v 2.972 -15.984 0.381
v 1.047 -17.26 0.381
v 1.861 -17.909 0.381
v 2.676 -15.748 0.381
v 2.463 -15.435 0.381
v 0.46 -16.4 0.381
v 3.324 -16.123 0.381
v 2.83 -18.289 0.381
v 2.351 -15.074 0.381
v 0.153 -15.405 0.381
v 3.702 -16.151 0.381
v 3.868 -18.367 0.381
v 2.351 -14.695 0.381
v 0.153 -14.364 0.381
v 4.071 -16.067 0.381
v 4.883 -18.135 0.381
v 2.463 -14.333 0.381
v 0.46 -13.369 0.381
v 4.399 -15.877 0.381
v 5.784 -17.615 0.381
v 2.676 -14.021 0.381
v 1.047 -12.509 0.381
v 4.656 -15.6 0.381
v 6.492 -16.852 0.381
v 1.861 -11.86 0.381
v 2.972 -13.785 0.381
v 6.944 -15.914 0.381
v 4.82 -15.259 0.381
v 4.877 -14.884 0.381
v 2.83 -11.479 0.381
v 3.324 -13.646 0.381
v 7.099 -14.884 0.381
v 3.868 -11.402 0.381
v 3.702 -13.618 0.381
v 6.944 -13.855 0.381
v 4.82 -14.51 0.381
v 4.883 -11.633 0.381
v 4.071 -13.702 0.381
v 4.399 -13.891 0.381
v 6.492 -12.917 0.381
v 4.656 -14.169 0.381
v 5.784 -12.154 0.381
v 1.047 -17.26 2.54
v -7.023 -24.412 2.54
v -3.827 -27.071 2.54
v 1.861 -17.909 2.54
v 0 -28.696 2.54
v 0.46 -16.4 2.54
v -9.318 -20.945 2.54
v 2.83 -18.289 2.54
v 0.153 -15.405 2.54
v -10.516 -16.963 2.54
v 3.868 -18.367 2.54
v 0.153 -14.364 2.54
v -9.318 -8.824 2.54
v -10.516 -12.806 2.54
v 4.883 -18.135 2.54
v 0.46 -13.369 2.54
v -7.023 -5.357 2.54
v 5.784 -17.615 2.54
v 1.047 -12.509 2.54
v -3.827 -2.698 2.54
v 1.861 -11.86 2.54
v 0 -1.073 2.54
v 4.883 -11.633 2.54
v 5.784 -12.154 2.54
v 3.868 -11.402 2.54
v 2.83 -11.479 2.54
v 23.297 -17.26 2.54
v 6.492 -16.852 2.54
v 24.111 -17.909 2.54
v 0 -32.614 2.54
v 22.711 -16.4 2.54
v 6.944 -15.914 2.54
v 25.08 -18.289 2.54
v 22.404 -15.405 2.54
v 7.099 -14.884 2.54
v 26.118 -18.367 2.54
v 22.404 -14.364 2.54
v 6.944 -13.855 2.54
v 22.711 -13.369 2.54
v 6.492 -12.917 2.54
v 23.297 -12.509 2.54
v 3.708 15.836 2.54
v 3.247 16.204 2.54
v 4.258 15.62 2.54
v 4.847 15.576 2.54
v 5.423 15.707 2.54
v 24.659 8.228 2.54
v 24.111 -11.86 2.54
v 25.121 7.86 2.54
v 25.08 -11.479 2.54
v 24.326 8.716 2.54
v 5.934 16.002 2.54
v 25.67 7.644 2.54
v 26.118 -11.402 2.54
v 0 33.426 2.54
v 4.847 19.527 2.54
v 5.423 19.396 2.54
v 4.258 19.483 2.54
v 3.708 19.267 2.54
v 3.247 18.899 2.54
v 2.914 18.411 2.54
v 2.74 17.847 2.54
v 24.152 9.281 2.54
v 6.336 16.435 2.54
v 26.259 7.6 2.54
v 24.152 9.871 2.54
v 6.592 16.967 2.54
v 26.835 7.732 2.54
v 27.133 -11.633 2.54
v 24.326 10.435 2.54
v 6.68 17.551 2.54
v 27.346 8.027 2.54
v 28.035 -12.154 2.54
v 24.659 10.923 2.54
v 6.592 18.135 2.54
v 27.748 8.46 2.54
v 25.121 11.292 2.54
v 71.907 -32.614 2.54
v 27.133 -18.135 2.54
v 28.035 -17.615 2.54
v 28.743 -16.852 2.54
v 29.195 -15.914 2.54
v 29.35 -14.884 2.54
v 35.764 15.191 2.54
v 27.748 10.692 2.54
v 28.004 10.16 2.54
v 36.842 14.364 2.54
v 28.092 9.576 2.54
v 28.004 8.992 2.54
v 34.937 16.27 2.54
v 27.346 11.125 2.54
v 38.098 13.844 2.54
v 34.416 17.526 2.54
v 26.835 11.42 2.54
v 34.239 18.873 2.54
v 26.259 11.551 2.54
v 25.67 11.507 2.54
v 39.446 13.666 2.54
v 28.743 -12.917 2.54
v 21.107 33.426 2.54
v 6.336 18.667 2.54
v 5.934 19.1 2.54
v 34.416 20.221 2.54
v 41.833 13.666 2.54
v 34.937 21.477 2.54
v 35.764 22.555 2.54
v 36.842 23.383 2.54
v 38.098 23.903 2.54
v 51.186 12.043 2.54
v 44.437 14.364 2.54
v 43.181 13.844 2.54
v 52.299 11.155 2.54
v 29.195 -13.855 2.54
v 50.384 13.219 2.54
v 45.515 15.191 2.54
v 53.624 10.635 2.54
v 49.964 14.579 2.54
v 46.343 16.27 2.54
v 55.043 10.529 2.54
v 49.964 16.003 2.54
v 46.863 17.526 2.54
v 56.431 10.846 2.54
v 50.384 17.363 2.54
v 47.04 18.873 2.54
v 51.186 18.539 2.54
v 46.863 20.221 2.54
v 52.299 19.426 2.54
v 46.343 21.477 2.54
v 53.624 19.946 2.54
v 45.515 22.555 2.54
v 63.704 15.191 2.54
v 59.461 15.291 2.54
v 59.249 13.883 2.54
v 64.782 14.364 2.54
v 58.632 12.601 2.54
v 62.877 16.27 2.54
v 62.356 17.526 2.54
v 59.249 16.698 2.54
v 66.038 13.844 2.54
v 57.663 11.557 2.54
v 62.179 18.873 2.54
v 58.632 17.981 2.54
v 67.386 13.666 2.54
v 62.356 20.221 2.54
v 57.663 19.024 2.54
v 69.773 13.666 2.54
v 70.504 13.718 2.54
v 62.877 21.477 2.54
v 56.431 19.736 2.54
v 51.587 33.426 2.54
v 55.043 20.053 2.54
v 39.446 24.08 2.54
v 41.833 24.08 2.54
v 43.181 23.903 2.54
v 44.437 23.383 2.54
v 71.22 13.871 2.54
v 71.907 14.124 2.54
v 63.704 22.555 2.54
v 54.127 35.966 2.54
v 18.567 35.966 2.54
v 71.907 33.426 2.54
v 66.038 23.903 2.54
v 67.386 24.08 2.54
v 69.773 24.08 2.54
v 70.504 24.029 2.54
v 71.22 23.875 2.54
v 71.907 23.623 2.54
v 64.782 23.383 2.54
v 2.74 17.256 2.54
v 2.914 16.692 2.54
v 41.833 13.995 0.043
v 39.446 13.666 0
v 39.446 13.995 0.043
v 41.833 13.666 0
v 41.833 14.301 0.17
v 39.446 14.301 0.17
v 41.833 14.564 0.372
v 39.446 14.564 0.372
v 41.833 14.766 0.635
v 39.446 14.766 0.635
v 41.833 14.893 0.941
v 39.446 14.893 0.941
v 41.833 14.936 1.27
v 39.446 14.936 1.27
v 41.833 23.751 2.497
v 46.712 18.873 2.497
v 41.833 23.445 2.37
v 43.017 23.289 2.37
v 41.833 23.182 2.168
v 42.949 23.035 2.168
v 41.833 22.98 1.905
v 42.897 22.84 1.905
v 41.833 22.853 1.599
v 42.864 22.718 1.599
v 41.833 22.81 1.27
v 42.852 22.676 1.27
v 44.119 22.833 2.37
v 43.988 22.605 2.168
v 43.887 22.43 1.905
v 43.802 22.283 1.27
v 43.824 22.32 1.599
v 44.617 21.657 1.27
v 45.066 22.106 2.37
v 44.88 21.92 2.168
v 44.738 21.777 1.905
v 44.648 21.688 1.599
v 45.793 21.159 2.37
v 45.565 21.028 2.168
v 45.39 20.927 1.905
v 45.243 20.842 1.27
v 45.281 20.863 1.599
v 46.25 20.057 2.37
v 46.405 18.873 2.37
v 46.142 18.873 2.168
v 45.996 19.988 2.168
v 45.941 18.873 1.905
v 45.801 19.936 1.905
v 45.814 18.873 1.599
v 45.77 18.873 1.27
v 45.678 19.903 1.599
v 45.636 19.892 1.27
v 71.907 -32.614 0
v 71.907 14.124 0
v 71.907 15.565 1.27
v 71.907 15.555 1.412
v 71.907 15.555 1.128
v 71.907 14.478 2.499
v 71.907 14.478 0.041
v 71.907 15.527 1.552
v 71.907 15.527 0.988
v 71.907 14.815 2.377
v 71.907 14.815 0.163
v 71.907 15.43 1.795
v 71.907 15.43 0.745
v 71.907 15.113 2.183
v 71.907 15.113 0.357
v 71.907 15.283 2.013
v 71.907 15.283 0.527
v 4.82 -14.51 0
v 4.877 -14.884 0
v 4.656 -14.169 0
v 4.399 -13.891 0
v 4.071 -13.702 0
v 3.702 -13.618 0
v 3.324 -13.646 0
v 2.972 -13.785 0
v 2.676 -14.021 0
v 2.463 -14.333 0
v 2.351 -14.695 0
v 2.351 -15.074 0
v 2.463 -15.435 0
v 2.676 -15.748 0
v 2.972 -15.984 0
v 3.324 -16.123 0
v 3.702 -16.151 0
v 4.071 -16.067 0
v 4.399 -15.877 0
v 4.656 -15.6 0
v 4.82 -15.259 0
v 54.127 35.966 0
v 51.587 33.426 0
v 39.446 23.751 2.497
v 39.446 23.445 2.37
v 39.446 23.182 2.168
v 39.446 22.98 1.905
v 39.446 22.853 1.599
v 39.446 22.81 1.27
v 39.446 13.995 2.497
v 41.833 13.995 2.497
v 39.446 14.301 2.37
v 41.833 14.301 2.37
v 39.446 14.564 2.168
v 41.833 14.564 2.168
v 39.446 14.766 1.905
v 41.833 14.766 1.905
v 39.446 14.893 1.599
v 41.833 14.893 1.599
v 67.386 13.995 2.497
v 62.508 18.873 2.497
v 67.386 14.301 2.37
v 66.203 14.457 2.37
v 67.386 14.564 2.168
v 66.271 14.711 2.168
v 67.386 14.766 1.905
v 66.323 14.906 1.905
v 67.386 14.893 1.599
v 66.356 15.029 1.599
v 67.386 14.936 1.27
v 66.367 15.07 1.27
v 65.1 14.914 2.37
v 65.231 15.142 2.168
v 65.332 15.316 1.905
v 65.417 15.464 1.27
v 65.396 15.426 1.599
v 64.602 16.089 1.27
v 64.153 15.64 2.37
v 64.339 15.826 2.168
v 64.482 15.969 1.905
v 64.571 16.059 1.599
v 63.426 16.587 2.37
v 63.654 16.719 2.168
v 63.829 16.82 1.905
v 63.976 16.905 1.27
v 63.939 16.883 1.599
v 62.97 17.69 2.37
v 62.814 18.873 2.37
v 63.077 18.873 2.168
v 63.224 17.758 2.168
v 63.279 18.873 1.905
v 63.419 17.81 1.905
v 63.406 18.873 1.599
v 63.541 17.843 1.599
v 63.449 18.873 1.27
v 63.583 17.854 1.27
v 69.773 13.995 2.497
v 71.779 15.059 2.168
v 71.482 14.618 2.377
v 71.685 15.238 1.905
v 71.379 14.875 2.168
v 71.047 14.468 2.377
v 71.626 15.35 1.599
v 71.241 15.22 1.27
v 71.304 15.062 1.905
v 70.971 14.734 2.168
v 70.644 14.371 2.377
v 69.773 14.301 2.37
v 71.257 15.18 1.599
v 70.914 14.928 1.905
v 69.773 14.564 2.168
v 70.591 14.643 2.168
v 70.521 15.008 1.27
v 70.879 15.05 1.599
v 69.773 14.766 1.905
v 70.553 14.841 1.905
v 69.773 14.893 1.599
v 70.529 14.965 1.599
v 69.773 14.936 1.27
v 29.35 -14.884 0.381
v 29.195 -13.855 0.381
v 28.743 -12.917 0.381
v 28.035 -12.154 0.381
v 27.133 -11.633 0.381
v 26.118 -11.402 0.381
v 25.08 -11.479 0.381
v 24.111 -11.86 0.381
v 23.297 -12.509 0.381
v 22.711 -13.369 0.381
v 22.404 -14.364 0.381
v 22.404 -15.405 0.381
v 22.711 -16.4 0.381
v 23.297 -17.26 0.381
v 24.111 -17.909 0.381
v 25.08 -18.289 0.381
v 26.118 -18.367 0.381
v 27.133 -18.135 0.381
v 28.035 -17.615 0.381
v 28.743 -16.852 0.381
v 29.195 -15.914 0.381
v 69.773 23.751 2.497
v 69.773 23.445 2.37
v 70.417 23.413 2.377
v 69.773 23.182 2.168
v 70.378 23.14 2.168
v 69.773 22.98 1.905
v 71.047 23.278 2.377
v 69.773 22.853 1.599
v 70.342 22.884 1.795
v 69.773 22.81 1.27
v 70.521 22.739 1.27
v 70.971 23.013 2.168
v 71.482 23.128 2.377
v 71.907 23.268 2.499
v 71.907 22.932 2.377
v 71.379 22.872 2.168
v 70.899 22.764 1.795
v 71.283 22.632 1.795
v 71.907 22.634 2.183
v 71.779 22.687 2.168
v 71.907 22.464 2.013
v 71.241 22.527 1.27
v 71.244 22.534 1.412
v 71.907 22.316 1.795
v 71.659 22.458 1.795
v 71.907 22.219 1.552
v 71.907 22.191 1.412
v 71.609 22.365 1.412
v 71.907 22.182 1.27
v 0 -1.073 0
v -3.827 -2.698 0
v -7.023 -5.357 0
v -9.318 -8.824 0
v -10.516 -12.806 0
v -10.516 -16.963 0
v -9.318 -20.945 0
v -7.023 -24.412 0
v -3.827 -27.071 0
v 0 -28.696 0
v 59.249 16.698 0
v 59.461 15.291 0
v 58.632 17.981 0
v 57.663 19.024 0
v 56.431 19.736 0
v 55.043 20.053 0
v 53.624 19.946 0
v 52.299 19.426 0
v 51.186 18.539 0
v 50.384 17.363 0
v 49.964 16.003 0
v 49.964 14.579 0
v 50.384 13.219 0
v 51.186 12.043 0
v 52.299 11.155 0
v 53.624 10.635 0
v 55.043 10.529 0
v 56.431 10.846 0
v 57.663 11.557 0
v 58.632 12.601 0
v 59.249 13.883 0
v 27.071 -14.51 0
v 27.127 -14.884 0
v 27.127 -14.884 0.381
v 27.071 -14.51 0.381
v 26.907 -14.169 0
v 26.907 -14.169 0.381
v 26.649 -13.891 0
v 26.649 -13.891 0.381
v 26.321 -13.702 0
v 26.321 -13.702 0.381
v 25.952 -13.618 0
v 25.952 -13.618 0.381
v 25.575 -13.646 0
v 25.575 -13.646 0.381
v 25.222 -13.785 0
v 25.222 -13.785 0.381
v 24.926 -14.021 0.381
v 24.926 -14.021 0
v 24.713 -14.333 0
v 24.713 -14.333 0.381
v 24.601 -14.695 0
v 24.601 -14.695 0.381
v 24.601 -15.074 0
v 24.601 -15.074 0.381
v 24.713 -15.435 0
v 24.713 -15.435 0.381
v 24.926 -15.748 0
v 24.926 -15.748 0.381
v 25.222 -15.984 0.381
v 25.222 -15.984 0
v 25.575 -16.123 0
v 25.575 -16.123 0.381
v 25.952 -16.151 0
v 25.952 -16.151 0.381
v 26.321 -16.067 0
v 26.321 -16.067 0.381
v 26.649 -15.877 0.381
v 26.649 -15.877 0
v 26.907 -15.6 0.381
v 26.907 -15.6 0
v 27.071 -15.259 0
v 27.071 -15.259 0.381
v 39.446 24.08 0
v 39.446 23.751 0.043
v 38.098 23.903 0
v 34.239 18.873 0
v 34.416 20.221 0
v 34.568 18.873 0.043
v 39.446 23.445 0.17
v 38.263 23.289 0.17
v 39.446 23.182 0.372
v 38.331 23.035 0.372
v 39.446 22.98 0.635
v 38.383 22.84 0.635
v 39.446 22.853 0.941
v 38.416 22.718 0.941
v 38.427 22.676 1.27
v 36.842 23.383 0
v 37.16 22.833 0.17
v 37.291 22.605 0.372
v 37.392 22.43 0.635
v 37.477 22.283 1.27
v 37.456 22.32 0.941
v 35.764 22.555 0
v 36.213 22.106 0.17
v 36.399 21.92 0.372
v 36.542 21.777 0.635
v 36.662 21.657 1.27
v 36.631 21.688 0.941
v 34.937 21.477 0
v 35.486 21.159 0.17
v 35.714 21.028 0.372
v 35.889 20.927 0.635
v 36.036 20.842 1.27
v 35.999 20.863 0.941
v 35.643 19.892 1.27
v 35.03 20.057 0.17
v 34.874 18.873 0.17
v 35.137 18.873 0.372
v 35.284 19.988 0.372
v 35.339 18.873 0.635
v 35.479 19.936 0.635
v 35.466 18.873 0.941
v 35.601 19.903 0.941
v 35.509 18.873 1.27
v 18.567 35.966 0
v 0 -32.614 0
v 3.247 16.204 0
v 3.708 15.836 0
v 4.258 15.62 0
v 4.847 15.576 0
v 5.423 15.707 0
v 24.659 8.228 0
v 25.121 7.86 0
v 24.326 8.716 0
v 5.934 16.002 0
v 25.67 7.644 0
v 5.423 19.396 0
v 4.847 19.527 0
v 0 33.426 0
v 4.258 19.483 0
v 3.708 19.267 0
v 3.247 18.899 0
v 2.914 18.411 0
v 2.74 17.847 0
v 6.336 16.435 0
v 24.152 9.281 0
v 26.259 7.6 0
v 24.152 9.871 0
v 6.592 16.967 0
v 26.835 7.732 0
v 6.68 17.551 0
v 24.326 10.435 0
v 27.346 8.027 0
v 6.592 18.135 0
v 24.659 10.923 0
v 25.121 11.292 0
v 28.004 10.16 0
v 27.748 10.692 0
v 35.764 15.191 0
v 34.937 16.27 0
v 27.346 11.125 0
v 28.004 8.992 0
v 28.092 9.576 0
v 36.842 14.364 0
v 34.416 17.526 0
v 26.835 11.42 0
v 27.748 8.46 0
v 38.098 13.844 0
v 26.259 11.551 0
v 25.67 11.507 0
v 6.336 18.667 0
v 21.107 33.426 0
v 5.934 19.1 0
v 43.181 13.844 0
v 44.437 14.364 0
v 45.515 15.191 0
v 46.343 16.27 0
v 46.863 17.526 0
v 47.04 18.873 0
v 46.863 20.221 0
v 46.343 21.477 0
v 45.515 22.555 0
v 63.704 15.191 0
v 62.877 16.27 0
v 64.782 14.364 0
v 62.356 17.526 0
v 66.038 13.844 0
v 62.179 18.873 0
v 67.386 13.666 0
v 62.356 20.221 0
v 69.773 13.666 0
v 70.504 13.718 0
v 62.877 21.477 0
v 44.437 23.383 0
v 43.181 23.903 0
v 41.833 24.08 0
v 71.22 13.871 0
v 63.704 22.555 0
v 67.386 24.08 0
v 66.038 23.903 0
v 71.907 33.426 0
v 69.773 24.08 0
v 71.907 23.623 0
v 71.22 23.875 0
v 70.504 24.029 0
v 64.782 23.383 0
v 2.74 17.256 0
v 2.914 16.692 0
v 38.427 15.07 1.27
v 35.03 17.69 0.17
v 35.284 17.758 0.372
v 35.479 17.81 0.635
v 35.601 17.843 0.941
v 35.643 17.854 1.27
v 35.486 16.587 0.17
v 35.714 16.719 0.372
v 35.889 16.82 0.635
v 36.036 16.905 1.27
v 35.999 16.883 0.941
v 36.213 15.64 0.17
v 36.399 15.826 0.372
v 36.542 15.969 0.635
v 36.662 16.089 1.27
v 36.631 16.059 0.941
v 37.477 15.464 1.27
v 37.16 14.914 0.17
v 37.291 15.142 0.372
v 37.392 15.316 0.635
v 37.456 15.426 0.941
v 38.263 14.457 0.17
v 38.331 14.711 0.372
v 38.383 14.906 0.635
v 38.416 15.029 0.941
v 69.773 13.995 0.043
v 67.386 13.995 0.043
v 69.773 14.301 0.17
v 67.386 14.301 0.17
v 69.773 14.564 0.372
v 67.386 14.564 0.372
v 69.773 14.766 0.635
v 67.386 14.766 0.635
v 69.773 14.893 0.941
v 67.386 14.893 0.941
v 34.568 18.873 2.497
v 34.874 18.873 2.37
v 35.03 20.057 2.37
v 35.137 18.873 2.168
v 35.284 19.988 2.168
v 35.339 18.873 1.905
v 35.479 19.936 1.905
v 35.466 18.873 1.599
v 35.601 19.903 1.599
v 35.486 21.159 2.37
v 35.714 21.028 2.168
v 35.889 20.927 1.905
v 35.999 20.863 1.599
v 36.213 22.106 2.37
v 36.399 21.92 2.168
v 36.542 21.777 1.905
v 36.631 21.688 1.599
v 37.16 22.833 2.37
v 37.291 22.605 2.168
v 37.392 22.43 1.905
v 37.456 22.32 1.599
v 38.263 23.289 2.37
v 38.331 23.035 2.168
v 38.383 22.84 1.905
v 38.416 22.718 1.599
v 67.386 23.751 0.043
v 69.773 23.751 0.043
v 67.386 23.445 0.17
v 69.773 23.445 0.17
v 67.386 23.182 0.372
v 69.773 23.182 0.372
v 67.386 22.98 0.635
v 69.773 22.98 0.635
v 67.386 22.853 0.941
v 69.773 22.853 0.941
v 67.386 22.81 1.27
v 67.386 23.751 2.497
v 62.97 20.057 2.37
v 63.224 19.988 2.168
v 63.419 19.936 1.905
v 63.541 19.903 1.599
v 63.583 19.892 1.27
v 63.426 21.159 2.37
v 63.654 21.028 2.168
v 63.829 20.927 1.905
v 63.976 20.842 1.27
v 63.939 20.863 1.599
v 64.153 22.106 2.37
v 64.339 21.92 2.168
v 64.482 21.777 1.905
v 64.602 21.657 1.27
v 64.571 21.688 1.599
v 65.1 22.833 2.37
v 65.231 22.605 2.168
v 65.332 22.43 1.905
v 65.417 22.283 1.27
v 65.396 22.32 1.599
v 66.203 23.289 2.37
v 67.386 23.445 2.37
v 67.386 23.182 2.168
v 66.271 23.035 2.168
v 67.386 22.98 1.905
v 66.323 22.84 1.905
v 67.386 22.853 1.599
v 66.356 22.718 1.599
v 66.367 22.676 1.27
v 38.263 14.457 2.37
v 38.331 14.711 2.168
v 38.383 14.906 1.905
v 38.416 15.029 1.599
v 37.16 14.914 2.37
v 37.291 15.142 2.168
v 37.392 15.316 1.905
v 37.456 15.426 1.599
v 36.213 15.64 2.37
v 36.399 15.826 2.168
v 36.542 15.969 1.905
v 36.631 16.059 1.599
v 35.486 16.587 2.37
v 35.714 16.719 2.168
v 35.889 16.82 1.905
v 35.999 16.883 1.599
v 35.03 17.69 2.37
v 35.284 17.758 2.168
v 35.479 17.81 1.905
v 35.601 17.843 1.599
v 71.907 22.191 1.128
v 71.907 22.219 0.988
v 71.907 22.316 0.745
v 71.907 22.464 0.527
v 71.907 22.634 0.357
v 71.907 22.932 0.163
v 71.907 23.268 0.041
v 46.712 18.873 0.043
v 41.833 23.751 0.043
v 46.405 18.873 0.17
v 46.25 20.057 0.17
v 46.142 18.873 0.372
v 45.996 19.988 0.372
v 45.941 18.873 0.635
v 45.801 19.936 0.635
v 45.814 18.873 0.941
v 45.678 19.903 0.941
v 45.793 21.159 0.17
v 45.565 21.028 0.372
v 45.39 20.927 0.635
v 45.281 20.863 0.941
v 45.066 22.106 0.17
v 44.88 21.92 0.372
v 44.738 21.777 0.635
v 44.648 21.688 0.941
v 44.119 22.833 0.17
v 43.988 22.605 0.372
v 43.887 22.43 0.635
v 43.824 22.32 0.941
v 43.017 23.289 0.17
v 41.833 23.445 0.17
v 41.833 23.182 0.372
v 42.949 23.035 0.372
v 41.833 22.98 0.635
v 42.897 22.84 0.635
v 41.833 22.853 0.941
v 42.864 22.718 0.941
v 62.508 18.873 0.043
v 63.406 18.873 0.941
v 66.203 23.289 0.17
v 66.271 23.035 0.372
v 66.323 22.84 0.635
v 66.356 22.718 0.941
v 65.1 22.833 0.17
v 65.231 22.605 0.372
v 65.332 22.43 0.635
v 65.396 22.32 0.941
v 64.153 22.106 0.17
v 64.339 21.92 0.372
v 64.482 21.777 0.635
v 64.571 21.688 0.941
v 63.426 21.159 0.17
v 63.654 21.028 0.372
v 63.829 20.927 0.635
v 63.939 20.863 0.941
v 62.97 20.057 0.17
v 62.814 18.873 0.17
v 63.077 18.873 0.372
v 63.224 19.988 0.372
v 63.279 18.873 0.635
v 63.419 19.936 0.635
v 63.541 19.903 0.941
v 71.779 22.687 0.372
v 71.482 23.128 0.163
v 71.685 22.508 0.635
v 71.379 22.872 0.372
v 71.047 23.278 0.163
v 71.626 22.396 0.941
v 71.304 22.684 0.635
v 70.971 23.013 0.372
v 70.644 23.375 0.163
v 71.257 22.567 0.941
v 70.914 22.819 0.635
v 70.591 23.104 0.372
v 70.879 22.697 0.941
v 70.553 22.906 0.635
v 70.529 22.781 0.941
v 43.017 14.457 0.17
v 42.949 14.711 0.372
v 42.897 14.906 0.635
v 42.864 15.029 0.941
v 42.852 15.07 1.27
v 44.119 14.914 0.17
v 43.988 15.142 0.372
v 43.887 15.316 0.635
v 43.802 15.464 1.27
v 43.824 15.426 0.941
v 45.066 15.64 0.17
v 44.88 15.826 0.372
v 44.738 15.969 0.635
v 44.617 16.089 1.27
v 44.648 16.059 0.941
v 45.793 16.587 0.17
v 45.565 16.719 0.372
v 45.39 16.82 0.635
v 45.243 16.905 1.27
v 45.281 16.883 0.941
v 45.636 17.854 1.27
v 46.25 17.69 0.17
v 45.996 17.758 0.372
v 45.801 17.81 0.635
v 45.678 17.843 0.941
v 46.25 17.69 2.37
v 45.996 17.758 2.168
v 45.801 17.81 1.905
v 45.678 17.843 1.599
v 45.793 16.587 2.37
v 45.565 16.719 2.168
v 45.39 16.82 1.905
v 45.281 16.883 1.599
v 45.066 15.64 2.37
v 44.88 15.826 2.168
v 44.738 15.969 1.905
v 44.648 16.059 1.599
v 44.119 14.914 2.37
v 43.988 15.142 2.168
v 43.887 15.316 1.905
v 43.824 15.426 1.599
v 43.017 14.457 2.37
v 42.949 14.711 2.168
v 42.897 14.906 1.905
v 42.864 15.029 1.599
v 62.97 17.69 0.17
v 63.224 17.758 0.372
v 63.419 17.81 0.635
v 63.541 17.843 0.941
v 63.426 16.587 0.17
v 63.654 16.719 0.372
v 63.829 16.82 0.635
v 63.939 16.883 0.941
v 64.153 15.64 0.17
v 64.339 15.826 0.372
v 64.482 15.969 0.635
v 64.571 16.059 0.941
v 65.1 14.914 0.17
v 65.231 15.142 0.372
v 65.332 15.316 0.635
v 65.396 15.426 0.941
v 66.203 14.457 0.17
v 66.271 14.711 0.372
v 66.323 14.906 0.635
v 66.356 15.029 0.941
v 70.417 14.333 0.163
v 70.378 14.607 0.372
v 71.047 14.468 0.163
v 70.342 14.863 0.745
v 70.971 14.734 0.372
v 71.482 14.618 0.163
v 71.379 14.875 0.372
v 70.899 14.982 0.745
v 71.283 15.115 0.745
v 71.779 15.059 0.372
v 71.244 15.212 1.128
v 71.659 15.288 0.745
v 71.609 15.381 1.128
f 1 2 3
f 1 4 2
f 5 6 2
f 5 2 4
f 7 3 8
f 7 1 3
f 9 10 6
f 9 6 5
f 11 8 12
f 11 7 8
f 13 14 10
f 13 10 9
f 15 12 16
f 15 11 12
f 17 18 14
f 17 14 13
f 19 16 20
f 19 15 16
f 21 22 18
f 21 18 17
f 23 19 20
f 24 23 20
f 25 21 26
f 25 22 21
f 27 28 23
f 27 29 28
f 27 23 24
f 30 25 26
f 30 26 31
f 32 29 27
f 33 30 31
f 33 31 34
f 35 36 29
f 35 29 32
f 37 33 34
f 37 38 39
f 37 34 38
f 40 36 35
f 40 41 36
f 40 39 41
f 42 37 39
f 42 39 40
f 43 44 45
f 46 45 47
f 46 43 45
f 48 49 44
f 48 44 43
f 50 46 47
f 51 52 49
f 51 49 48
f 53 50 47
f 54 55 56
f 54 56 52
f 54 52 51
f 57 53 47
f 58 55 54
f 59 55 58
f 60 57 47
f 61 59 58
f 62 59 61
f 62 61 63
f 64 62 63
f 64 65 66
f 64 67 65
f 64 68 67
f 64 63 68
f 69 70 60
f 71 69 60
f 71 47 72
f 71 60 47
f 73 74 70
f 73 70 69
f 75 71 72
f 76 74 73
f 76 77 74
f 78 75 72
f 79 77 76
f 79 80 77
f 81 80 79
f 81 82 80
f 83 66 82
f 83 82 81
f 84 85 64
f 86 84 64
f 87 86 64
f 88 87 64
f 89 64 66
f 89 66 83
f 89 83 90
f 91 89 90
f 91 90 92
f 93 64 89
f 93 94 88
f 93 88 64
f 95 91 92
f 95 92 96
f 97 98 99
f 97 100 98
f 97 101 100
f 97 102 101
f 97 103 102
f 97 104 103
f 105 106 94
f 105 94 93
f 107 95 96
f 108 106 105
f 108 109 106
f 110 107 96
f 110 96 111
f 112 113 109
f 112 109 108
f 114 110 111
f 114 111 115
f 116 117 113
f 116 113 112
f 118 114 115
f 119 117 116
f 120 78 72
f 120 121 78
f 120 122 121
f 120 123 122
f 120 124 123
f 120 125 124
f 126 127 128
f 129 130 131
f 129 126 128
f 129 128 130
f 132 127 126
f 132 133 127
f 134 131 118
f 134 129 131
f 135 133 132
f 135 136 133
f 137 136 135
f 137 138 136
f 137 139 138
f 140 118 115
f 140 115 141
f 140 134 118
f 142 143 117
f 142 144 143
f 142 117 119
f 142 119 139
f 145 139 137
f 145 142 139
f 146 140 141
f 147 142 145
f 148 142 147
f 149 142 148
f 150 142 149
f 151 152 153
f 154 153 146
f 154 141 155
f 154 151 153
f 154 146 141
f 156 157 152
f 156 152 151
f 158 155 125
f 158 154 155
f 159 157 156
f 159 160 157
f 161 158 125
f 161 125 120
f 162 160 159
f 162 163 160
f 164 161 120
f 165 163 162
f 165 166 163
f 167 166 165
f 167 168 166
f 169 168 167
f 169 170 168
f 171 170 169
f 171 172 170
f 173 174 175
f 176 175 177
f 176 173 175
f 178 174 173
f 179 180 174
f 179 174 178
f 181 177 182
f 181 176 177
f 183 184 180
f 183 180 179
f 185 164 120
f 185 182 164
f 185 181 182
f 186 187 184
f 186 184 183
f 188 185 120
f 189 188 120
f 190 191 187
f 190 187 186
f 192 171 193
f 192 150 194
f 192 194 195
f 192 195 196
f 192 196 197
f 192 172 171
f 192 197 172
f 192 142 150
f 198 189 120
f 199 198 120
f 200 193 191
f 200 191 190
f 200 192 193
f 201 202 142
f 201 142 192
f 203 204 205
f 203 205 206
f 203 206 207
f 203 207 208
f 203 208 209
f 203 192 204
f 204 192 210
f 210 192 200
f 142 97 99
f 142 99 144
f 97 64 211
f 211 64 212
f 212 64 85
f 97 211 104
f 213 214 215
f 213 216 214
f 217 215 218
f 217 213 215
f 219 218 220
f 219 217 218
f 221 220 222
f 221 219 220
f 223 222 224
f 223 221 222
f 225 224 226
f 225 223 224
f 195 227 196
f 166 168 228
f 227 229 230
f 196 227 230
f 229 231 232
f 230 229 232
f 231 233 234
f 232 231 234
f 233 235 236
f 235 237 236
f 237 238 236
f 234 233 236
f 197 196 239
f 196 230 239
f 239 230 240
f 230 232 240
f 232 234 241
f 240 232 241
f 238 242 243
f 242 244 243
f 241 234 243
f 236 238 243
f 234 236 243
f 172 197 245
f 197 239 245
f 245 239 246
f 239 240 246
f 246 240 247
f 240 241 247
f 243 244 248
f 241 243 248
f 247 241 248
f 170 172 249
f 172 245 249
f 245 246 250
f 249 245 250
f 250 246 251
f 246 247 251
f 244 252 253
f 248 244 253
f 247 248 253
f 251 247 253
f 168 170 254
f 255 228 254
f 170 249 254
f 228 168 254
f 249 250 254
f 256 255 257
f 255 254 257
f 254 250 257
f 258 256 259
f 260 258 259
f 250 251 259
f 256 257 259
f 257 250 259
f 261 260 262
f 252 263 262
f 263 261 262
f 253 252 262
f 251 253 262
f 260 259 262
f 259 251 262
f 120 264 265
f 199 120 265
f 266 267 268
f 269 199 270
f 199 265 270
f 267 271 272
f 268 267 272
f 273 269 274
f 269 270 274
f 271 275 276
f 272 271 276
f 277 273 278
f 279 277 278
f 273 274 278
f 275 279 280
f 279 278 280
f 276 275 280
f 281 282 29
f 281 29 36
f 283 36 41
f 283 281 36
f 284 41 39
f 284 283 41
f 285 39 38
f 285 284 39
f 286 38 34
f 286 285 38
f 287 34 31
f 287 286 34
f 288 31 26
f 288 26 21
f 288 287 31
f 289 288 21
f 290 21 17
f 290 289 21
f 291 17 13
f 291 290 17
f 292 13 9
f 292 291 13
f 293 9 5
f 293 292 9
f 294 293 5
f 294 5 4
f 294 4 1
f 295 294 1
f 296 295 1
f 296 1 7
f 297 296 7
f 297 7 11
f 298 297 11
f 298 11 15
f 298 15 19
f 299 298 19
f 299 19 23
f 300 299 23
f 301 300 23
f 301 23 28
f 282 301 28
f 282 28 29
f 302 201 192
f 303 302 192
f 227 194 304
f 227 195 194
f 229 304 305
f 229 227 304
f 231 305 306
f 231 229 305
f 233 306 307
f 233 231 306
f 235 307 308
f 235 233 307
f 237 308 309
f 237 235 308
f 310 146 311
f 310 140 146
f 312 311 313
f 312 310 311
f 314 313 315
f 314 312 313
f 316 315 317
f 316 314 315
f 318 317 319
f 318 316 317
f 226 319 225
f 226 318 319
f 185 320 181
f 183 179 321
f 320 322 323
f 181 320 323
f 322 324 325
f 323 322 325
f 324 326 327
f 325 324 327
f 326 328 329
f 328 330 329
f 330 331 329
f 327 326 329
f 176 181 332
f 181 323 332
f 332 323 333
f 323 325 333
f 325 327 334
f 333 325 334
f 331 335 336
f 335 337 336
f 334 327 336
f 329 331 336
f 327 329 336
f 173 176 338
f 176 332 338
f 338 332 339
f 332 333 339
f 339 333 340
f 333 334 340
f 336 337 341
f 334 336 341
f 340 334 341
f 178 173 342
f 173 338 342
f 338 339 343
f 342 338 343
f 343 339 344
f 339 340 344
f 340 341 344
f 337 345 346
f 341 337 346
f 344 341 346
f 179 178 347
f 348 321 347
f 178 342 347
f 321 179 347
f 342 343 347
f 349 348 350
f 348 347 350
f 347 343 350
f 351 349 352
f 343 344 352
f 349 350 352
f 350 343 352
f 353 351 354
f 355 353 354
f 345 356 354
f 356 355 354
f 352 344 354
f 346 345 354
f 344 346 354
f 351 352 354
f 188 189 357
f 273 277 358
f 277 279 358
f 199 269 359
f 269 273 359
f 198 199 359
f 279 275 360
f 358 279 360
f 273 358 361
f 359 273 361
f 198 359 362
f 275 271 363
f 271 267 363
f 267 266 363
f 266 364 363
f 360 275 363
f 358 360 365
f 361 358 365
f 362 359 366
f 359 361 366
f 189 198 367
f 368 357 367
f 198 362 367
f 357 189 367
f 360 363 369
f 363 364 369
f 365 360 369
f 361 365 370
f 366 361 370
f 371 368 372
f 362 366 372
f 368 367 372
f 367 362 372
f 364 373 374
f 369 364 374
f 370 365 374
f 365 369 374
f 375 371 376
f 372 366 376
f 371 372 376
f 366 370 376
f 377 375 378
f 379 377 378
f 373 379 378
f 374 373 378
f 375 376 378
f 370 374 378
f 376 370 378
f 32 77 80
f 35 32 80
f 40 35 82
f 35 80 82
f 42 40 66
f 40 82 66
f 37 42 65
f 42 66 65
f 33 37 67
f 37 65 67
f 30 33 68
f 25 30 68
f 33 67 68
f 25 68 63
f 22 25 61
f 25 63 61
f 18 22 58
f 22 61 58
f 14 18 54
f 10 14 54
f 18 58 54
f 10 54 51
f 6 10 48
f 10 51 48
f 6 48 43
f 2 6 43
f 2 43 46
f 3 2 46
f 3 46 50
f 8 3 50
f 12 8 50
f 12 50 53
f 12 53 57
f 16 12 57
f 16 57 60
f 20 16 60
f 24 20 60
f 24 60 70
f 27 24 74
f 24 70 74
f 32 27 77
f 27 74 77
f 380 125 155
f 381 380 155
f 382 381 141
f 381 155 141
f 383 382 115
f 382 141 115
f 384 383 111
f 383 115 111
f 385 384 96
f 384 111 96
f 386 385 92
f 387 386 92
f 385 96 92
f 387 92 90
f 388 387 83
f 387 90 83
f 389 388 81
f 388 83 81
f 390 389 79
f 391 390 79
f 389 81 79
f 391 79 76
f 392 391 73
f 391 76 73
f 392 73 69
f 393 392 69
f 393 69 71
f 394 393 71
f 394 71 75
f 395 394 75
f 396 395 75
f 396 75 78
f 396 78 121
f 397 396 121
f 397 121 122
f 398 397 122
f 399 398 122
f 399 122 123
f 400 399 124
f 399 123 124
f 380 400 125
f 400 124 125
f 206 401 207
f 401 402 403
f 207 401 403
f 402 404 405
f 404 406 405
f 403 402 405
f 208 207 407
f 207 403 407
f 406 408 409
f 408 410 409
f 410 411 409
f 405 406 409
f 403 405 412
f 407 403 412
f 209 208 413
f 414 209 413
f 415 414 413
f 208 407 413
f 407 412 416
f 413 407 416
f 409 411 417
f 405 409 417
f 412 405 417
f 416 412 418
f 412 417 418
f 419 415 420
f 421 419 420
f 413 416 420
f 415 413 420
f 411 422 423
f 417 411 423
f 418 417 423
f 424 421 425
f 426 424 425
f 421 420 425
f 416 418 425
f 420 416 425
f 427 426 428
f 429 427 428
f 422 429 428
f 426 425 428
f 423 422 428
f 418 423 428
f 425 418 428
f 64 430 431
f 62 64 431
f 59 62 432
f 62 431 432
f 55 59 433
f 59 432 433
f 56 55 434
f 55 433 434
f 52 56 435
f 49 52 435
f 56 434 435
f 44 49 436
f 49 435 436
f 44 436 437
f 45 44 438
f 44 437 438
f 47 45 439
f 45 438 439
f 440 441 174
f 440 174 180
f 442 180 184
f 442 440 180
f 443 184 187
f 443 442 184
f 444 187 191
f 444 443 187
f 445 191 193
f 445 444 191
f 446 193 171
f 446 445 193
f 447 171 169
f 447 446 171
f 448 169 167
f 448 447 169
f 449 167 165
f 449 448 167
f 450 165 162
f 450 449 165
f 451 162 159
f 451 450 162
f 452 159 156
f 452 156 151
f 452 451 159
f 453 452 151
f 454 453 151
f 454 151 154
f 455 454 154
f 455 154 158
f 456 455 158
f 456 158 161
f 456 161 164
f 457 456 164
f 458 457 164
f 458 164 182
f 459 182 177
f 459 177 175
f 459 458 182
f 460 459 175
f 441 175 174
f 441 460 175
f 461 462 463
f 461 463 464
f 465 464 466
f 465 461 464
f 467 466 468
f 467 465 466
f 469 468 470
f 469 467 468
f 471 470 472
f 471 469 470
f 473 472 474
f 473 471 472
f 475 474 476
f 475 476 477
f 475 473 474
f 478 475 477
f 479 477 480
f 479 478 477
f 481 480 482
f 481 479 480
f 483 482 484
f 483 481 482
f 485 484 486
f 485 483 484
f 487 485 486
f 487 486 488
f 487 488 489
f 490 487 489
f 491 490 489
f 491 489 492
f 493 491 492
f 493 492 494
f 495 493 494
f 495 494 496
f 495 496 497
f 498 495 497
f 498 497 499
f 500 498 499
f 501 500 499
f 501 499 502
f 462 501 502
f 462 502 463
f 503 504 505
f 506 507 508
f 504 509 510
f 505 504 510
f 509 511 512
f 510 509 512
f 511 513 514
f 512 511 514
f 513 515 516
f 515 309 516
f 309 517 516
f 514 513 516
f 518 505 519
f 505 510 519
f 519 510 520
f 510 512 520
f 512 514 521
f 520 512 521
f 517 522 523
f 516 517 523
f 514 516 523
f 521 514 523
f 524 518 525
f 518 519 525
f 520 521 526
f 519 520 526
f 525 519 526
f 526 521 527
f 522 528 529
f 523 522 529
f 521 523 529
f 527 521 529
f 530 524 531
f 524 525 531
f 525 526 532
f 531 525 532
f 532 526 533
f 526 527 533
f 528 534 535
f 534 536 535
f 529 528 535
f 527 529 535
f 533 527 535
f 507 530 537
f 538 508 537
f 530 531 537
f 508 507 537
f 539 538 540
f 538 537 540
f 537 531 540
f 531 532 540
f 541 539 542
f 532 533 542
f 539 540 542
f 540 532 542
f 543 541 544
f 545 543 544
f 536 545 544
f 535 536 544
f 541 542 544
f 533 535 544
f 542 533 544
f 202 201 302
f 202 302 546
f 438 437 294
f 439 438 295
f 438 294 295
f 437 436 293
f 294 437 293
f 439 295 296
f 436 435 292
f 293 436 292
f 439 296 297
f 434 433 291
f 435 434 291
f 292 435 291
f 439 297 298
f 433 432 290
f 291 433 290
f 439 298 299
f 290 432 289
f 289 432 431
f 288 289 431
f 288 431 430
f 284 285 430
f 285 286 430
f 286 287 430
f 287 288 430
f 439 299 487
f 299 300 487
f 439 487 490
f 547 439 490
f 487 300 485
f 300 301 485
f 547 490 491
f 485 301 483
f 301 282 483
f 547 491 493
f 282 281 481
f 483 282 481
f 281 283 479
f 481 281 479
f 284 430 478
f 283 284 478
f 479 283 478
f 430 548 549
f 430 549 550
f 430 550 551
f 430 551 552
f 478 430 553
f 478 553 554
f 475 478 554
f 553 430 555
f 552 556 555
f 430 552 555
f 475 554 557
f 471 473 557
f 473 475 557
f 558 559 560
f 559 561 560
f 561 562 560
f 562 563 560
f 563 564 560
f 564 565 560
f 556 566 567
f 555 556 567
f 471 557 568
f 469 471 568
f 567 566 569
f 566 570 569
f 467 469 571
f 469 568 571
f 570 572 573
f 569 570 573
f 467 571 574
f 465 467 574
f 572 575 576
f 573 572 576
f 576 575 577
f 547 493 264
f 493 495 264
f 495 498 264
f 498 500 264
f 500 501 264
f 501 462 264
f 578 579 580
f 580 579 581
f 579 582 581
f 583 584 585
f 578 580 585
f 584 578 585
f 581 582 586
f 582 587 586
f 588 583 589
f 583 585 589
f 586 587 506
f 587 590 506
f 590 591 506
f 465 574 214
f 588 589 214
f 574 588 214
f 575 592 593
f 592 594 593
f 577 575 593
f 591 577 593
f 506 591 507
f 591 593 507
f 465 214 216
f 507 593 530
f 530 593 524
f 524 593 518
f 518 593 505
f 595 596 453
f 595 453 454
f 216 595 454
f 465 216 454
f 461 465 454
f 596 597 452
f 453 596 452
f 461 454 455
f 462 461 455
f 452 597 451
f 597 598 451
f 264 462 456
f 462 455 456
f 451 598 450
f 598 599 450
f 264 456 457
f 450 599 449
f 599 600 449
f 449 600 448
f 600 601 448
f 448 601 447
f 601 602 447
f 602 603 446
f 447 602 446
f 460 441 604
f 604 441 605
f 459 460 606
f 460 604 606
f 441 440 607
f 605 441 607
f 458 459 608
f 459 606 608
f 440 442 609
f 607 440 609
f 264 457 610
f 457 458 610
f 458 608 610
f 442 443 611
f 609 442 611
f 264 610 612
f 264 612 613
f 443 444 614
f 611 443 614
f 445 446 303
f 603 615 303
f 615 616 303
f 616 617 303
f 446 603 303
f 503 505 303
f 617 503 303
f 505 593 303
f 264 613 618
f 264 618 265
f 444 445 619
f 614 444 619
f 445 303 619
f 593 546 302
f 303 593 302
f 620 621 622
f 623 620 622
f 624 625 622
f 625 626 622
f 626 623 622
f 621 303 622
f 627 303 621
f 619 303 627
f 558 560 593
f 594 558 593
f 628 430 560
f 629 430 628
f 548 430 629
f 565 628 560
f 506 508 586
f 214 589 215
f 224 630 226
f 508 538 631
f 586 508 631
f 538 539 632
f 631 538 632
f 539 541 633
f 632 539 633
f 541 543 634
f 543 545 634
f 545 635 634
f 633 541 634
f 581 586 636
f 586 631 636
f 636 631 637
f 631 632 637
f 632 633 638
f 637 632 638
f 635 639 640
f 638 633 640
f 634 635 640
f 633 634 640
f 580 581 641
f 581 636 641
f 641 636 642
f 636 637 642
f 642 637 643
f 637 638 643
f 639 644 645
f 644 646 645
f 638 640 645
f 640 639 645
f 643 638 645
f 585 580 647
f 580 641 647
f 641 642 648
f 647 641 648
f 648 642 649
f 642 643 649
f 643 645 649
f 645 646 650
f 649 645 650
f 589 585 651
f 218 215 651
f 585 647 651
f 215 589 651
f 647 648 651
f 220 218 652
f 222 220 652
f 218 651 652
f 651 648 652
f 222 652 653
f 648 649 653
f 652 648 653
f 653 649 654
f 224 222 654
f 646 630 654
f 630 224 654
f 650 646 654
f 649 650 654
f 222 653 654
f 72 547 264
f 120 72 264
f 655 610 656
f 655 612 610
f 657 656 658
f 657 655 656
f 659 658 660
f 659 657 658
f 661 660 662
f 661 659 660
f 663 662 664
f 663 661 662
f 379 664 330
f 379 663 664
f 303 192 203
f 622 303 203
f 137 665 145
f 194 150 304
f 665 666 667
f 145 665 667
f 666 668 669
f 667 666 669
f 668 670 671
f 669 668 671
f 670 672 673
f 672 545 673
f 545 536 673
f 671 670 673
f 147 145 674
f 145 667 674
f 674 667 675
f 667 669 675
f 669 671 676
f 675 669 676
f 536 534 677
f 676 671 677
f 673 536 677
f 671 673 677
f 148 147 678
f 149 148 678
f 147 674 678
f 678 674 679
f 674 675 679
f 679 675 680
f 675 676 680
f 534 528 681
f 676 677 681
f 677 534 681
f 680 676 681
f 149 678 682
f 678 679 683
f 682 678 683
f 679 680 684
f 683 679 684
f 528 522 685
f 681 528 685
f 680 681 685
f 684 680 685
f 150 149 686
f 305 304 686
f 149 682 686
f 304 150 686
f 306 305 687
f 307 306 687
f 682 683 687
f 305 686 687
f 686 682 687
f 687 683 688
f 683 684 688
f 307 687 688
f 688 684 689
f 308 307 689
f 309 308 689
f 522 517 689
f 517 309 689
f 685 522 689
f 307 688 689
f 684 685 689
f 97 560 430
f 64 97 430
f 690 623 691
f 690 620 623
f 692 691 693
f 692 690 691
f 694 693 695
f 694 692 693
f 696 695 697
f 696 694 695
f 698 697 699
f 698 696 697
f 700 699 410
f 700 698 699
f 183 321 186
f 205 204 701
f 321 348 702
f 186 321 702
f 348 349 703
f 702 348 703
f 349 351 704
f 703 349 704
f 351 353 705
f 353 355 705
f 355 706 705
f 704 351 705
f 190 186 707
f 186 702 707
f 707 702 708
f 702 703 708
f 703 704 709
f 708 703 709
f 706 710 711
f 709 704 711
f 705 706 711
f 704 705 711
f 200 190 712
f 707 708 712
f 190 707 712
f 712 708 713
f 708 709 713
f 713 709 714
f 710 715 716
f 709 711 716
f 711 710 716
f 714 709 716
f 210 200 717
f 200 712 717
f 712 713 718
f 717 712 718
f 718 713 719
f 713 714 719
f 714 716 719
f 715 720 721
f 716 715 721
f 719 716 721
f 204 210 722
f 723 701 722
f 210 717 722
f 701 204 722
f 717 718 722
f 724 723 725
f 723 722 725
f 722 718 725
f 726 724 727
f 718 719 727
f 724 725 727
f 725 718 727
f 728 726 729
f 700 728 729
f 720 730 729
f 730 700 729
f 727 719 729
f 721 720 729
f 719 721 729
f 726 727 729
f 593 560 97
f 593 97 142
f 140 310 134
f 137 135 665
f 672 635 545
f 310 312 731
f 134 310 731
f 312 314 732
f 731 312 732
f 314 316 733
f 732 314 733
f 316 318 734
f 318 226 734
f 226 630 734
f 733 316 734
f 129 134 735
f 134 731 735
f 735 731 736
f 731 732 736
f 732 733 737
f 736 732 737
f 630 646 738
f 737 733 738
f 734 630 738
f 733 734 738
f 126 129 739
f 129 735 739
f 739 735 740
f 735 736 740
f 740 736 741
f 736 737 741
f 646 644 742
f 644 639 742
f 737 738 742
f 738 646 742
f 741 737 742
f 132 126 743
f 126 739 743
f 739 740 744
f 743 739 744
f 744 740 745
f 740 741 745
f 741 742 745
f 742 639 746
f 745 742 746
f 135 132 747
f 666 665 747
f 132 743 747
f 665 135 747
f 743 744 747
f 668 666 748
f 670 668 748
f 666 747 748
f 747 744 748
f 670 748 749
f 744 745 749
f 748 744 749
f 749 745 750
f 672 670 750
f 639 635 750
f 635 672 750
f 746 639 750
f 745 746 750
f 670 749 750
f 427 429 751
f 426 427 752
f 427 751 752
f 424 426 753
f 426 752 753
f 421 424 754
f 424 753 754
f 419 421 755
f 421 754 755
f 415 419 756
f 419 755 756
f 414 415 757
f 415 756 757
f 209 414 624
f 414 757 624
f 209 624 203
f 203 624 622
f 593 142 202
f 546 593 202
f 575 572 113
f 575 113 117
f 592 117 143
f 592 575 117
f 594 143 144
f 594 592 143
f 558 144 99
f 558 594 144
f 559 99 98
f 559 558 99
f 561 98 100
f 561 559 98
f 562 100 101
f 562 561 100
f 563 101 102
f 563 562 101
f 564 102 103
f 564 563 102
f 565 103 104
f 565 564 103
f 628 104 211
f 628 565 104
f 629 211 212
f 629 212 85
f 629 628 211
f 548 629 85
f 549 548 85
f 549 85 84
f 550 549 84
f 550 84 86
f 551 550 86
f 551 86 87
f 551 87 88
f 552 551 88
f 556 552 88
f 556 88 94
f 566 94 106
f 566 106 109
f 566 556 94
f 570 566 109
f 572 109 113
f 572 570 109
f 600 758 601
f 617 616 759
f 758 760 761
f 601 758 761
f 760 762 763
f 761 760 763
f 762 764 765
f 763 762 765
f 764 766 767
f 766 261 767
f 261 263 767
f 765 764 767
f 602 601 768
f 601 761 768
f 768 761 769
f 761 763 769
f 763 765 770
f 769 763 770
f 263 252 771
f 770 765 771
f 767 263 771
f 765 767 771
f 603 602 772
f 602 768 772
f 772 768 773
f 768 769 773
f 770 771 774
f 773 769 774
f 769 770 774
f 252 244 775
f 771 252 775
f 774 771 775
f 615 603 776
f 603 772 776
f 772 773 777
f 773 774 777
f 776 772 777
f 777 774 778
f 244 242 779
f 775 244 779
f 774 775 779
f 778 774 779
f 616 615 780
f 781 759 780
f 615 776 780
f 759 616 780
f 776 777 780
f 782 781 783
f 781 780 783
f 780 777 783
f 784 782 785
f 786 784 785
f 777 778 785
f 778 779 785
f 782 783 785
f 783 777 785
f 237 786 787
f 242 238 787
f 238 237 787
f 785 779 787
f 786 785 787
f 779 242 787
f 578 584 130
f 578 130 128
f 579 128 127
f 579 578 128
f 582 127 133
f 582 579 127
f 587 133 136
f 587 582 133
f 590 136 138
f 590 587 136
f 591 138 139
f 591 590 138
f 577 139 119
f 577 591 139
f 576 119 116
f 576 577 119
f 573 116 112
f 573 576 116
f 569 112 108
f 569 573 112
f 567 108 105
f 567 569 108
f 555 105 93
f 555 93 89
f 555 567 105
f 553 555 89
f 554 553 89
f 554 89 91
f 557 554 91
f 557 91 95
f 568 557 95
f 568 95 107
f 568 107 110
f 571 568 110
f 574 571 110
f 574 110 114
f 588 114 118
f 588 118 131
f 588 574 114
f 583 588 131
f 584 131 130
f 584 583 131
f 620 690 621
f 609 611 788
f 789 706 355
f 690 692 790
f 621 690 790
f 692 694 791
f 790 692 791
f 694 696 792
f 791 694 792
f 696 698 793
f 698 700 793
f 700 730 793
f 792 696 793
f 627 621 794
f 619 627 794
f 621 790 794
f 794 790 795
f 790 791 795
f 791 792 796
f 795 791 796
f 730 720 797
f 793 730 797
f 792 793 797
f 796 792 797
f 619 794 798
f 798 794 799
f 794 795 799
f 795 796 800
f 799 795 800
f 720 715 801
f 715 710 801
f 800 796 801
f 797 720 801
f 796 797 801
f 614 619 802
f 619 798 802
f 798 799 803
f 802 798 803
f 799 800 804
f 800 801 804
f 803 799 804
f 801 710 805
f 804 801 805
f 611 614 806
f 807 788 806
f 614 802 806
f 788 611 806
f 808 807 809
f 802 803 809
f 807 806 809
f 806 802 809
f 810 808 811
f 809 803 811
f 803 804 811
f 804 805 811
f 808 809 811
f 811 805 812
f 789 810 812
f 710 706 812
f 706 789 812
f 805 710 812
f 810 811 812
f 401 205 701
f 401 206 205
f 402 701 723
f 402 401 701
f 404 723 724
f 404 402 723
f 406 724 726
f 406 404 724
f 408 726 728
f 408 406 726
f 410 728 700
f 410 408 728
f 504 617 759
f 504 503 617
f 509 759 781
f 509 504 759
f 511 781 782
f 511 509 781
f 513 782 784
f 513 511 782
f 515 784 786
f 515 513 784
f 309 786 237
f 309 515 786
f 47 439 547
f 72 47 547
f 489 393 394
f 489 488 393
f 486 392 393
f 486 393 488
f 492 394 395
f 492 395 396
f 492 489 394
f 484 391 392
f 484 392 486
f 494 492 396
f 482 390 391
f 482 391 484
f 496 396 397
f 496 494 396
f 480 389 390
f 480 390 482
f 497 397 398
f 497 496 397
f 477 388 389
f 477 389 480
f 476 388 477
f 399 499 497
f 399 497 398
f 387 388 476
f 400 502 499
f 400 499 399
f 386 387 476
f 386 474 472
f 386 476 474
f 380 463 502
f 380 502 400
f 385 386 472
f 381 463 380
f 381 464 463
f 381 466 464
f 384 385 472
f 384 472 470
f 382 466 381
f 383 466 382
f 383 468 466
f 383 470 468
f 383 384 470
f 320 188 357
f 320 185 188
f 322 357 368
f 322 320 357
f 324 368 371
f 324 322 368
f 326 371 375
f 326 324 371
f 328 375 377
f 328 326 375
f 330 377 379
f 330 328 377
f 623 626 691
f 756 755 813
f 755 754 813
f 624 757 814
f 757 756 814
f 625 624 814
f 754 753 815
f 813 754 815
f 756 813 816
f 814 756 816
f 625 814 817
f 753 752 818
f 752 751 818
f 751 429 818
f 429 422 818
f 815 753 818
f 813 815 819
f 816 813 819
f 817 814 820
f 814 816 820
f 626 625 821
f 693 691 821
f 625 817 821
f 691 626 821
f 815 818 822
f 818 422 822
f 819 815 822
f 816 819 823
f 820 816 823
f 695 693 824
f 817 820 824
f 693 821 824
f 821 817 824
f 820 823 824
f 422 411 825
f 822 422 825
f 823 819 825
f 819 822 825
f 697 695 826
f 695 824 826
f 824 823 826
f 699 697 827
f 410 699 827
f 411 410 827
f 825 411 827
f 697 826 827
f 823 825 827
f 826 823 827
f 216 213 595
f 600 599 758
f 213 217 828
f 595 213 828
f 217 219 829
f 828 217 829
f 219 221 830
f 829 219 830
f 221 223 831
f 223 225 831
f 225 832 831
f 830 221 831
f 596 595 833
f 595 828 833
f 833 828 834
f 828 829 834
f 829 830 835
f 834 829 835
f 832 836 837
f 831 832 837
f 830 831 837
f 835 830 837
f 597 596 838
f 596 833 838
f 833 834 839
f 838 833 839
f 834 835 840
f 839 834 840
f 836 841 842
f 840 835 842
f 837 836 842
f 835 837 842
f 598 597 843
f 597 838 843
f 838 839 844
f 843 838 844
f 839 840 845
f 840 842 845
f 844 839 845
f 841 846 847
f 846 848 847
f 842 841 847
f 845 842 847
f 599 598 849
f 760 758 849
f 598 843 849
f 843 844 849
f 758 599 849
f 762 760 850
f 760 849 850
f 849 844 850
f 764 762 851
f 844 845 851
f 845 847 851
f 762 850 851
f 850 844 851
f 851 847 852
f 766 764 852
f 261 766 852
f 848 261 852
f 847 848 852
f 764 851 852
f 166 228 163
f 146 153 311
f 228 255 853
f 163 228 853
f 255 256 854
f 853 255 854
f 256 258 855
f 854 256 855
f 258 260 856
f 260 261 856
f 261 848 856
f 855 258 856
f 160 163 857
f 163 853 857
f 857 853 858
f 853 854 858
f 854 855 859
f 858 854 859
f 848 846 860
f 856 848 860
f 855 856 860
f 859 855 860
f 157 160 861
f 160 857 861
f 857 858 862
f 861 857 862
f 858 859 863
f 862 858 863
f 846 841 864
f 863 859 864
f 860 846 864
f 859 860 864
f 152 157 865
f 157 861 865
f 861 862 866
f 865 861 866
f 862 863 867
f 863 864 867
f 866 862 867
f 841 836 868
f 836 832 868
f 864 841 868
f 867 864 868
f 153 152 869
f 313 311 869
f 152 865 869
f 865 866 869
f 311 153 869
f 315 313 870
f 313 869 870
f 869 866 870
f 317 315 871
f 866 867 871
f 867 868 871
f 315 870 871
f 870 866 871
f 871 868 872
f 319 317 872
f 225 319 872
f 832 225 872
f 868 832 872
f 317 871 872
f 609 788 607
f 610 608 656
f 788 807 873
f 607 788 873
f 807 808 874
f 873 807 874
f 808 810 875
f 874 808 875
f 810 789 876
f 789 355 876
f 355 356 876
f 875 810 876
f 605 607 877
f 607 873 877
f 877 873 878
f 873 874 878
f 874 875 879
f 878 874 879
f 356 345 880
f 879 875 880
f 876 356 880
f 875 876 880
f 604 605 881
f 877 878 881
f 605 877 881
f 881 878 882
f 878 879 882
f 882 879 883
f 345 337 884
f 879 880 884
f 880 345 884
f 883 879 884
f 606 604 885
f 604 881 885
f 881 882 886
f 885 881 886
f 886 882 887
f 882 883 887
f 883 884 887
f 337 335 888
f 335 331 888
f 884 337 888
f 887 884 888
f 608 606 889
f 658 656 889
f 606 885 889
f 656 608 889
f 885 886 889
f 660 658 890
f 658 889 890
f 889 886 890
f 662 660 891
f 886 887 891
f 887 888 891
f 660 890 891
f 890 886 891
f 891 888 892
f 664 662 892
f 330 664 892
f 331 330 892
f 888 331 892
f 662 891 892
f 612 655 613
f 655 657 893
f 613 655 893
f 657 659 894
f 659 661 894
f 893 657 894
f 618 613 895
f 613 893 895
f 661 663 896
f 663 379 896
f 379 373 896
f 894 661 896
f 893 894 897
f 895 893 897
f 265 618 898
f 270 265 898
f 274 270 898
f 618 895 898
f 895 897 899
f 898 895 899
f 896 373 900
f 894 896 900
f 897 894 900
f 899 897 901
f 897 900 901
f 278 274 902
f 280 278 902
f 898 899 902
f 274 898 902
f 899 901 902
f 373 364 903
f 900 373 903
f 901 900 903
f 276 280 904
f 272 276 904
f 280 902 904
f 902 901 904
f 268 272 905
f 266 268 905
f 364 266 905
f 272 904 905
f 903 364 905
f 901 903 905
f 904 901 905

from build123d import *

# Parameters (mm, degrees)
F0_W     = 71.9074
F0_H     = 33.4264
F0_R     = 1.9812
F0_R_2   = 4.7752
F0_R_3   = 1.27
F1_DEPTH = 2.54
F3_DEPTH = 25.4
F4_W     = 35.56
F4_H     = 2.54
F5_DEPTH = 2.54
F7_DEPTH = 2.54
F8_R     = 3.4925
F8_R_2   = 1.27
F9_DEPTH = 2.159
F10_R    = 1.26999


# Not quite as in the source:
# - a fillet or chamfer is up to 0.001 mm smaller than in the source, because OpenCascade refuses the exact size


with BuildPart() as f1:
    # F0 (on Top) → F1 (new body)
    with BuildSketch(Plane.XY):
        with Locations((35.9537, 16.7132)):
            Rectangle(F0_W, F0_H)
        with Locations((26.1112, 9.5758)):
            Circle(F0_R, mode=Mode.SUBTRACT)
        with Locations((4.699, 17.5514)):
            Circle(F0_R, mode=Mode.SUBTRACT)
        with Locations((54.6862, 15.2908)):
            Circle(F0_R_2, mode=Mode.SUBTRACT)
        Polygon((71.9074, 0), (0, 0), (0, -1.0727777636), (0, -28.6960222364), (0, -32.6136), (71.9074, -32.6136), align=None)
        with Locations((3.6068, -14.8844)):
            Circle(F0_R_3, mode=Mode.SUBTRACT)
        with Locations((25.8572, -14.8844)):
            Circle(F0_R_3, mode=Mode.SUBTRACT)
        with BuildLine():
            Line((0, -28.6960222364), (0, -1.0727777636))
            ThreePointArc((0, -1.0727777636), (-10.668, -14.8844), (0, -28.6960222364))
        make_face()
    extrude(amount=F1_DEPTH)

    # F2 (on face) → F3 (cut)
    with BuildSketch(Plane.XY):
        with BuildLine():
            ThreePointArc((73.7104990378, 18.8731995366), (72.5573784353, 21.6570789342), (69.7734990378, 22.8101995366))
            Line((69.7734990378, 22.8101995366), (67.3858990378, 22.8101995366))
            ThreePointArc((67.3858990378, 22.8101995366), (64.6020196402, 21.6570789342), (63.4488990378, 18.8731995366))
            ThreePointArc((63.4488990378, 18.8731995366), (64.6020196402, 16.0893201391), (67.3858990378, 14.9361995366))
            Line((67.3858990378, 14.9361995366), (69.7734990378, 14.9361995366))
            ThreePointArc((69.7734990378, 14.9361995366), (72.5573784353, 16.0893201391), (73.7104990378, 18.8731995366))
        make_face()
        with BuildLine():
            ThreePointArc((45.7704990378, 18.8731995366), (44.6173784353, 21.6570789342), (41.8334990378, 22.8101995366))
            Line((41.8334990378, 22.8101995366), (39.4458990378, 22.8101995366))
            ThreePointArc((39.4458990378, 22.8101995366), (36.6620196402, 21.6570789342), (35.5088990378, 18.8731995366))
            ThreePointArc((35.5088990378, 18.8731995366), (36.6620196402, 16.0893201391), (39.4458990378, 14.9361995366))
            Line((39.4458990378, 14.9361995366), (41.8334990378, 14.9361995366))
            ThreePointArc((41.8334990378, 14.9361995366), (44.6173784353, 16.0893201391), (45.7704990378, 18.8731995366))
        make_face()
    extrude(amount=F3_DEPTH, mode=Mode.SUBTRACT)

    # F4 (on face) → F5 (join)
    with BuildSketch(Plane(origin=(0, 33.4264, 0), x_dir=(-1, 0, 0), z_dir=(0, 1, 0))):
        with Locations((-36.3474, 1.27)):
            Rectangle(F4_W, F4_H)
    extrude(amount=F5_DEPTH)

    # F6 (on face) → F7 (cut)
    with BuildSketch(Plane.XY.offset(2.54)):
        Polygon((18.5674, 33.4264), (21.1074, 33.4264), (18.5674, 35.9664), align=None)
        Polygon((54.1274, 33.4264), (54.1274, 35.9664), (51.5874, 33.4264), align=None)
    extrude(amount=-F7_DEPTH, mode=Mode.SUBTRACT)

    # F8 (on face) → F9 (cut)
    with BuildSketch(Plane.XY.offset(2.54)):
        with Locations((3.6068, -14.8844)):
            Circle(F8_R)
        with Locations((3.6068, -14.8844)):
            Circle(F8_R_2, mode=Mode.SUBTRACT)
        with Locations((25.8572, -14.8844)):
            Circle(F8_R)
        with Locations((25.8572, -14.8844)):
            Circle(F8_R_2, mode=Mode.SUBTRACT)
    extrude(amount=-F9_DEPTH, mode=Mode.SUBTRACT)

    # F10 (radius 1.27 in the source; OpenCascade refuses exactly that, so slightly less here)
    f10_edges = [f1.edges().sort_by_distance(p)[0] for p in [
        (35.508899, 18.8732, 2.54),
        (63.448899, 18.8732, 2.54),
        (63.448899, 18.8732, 0),
        (45.770499, 18.8732, 0),
    ]]
    fillet(f10_edges, radius=F10_R)


solid = f1.part
